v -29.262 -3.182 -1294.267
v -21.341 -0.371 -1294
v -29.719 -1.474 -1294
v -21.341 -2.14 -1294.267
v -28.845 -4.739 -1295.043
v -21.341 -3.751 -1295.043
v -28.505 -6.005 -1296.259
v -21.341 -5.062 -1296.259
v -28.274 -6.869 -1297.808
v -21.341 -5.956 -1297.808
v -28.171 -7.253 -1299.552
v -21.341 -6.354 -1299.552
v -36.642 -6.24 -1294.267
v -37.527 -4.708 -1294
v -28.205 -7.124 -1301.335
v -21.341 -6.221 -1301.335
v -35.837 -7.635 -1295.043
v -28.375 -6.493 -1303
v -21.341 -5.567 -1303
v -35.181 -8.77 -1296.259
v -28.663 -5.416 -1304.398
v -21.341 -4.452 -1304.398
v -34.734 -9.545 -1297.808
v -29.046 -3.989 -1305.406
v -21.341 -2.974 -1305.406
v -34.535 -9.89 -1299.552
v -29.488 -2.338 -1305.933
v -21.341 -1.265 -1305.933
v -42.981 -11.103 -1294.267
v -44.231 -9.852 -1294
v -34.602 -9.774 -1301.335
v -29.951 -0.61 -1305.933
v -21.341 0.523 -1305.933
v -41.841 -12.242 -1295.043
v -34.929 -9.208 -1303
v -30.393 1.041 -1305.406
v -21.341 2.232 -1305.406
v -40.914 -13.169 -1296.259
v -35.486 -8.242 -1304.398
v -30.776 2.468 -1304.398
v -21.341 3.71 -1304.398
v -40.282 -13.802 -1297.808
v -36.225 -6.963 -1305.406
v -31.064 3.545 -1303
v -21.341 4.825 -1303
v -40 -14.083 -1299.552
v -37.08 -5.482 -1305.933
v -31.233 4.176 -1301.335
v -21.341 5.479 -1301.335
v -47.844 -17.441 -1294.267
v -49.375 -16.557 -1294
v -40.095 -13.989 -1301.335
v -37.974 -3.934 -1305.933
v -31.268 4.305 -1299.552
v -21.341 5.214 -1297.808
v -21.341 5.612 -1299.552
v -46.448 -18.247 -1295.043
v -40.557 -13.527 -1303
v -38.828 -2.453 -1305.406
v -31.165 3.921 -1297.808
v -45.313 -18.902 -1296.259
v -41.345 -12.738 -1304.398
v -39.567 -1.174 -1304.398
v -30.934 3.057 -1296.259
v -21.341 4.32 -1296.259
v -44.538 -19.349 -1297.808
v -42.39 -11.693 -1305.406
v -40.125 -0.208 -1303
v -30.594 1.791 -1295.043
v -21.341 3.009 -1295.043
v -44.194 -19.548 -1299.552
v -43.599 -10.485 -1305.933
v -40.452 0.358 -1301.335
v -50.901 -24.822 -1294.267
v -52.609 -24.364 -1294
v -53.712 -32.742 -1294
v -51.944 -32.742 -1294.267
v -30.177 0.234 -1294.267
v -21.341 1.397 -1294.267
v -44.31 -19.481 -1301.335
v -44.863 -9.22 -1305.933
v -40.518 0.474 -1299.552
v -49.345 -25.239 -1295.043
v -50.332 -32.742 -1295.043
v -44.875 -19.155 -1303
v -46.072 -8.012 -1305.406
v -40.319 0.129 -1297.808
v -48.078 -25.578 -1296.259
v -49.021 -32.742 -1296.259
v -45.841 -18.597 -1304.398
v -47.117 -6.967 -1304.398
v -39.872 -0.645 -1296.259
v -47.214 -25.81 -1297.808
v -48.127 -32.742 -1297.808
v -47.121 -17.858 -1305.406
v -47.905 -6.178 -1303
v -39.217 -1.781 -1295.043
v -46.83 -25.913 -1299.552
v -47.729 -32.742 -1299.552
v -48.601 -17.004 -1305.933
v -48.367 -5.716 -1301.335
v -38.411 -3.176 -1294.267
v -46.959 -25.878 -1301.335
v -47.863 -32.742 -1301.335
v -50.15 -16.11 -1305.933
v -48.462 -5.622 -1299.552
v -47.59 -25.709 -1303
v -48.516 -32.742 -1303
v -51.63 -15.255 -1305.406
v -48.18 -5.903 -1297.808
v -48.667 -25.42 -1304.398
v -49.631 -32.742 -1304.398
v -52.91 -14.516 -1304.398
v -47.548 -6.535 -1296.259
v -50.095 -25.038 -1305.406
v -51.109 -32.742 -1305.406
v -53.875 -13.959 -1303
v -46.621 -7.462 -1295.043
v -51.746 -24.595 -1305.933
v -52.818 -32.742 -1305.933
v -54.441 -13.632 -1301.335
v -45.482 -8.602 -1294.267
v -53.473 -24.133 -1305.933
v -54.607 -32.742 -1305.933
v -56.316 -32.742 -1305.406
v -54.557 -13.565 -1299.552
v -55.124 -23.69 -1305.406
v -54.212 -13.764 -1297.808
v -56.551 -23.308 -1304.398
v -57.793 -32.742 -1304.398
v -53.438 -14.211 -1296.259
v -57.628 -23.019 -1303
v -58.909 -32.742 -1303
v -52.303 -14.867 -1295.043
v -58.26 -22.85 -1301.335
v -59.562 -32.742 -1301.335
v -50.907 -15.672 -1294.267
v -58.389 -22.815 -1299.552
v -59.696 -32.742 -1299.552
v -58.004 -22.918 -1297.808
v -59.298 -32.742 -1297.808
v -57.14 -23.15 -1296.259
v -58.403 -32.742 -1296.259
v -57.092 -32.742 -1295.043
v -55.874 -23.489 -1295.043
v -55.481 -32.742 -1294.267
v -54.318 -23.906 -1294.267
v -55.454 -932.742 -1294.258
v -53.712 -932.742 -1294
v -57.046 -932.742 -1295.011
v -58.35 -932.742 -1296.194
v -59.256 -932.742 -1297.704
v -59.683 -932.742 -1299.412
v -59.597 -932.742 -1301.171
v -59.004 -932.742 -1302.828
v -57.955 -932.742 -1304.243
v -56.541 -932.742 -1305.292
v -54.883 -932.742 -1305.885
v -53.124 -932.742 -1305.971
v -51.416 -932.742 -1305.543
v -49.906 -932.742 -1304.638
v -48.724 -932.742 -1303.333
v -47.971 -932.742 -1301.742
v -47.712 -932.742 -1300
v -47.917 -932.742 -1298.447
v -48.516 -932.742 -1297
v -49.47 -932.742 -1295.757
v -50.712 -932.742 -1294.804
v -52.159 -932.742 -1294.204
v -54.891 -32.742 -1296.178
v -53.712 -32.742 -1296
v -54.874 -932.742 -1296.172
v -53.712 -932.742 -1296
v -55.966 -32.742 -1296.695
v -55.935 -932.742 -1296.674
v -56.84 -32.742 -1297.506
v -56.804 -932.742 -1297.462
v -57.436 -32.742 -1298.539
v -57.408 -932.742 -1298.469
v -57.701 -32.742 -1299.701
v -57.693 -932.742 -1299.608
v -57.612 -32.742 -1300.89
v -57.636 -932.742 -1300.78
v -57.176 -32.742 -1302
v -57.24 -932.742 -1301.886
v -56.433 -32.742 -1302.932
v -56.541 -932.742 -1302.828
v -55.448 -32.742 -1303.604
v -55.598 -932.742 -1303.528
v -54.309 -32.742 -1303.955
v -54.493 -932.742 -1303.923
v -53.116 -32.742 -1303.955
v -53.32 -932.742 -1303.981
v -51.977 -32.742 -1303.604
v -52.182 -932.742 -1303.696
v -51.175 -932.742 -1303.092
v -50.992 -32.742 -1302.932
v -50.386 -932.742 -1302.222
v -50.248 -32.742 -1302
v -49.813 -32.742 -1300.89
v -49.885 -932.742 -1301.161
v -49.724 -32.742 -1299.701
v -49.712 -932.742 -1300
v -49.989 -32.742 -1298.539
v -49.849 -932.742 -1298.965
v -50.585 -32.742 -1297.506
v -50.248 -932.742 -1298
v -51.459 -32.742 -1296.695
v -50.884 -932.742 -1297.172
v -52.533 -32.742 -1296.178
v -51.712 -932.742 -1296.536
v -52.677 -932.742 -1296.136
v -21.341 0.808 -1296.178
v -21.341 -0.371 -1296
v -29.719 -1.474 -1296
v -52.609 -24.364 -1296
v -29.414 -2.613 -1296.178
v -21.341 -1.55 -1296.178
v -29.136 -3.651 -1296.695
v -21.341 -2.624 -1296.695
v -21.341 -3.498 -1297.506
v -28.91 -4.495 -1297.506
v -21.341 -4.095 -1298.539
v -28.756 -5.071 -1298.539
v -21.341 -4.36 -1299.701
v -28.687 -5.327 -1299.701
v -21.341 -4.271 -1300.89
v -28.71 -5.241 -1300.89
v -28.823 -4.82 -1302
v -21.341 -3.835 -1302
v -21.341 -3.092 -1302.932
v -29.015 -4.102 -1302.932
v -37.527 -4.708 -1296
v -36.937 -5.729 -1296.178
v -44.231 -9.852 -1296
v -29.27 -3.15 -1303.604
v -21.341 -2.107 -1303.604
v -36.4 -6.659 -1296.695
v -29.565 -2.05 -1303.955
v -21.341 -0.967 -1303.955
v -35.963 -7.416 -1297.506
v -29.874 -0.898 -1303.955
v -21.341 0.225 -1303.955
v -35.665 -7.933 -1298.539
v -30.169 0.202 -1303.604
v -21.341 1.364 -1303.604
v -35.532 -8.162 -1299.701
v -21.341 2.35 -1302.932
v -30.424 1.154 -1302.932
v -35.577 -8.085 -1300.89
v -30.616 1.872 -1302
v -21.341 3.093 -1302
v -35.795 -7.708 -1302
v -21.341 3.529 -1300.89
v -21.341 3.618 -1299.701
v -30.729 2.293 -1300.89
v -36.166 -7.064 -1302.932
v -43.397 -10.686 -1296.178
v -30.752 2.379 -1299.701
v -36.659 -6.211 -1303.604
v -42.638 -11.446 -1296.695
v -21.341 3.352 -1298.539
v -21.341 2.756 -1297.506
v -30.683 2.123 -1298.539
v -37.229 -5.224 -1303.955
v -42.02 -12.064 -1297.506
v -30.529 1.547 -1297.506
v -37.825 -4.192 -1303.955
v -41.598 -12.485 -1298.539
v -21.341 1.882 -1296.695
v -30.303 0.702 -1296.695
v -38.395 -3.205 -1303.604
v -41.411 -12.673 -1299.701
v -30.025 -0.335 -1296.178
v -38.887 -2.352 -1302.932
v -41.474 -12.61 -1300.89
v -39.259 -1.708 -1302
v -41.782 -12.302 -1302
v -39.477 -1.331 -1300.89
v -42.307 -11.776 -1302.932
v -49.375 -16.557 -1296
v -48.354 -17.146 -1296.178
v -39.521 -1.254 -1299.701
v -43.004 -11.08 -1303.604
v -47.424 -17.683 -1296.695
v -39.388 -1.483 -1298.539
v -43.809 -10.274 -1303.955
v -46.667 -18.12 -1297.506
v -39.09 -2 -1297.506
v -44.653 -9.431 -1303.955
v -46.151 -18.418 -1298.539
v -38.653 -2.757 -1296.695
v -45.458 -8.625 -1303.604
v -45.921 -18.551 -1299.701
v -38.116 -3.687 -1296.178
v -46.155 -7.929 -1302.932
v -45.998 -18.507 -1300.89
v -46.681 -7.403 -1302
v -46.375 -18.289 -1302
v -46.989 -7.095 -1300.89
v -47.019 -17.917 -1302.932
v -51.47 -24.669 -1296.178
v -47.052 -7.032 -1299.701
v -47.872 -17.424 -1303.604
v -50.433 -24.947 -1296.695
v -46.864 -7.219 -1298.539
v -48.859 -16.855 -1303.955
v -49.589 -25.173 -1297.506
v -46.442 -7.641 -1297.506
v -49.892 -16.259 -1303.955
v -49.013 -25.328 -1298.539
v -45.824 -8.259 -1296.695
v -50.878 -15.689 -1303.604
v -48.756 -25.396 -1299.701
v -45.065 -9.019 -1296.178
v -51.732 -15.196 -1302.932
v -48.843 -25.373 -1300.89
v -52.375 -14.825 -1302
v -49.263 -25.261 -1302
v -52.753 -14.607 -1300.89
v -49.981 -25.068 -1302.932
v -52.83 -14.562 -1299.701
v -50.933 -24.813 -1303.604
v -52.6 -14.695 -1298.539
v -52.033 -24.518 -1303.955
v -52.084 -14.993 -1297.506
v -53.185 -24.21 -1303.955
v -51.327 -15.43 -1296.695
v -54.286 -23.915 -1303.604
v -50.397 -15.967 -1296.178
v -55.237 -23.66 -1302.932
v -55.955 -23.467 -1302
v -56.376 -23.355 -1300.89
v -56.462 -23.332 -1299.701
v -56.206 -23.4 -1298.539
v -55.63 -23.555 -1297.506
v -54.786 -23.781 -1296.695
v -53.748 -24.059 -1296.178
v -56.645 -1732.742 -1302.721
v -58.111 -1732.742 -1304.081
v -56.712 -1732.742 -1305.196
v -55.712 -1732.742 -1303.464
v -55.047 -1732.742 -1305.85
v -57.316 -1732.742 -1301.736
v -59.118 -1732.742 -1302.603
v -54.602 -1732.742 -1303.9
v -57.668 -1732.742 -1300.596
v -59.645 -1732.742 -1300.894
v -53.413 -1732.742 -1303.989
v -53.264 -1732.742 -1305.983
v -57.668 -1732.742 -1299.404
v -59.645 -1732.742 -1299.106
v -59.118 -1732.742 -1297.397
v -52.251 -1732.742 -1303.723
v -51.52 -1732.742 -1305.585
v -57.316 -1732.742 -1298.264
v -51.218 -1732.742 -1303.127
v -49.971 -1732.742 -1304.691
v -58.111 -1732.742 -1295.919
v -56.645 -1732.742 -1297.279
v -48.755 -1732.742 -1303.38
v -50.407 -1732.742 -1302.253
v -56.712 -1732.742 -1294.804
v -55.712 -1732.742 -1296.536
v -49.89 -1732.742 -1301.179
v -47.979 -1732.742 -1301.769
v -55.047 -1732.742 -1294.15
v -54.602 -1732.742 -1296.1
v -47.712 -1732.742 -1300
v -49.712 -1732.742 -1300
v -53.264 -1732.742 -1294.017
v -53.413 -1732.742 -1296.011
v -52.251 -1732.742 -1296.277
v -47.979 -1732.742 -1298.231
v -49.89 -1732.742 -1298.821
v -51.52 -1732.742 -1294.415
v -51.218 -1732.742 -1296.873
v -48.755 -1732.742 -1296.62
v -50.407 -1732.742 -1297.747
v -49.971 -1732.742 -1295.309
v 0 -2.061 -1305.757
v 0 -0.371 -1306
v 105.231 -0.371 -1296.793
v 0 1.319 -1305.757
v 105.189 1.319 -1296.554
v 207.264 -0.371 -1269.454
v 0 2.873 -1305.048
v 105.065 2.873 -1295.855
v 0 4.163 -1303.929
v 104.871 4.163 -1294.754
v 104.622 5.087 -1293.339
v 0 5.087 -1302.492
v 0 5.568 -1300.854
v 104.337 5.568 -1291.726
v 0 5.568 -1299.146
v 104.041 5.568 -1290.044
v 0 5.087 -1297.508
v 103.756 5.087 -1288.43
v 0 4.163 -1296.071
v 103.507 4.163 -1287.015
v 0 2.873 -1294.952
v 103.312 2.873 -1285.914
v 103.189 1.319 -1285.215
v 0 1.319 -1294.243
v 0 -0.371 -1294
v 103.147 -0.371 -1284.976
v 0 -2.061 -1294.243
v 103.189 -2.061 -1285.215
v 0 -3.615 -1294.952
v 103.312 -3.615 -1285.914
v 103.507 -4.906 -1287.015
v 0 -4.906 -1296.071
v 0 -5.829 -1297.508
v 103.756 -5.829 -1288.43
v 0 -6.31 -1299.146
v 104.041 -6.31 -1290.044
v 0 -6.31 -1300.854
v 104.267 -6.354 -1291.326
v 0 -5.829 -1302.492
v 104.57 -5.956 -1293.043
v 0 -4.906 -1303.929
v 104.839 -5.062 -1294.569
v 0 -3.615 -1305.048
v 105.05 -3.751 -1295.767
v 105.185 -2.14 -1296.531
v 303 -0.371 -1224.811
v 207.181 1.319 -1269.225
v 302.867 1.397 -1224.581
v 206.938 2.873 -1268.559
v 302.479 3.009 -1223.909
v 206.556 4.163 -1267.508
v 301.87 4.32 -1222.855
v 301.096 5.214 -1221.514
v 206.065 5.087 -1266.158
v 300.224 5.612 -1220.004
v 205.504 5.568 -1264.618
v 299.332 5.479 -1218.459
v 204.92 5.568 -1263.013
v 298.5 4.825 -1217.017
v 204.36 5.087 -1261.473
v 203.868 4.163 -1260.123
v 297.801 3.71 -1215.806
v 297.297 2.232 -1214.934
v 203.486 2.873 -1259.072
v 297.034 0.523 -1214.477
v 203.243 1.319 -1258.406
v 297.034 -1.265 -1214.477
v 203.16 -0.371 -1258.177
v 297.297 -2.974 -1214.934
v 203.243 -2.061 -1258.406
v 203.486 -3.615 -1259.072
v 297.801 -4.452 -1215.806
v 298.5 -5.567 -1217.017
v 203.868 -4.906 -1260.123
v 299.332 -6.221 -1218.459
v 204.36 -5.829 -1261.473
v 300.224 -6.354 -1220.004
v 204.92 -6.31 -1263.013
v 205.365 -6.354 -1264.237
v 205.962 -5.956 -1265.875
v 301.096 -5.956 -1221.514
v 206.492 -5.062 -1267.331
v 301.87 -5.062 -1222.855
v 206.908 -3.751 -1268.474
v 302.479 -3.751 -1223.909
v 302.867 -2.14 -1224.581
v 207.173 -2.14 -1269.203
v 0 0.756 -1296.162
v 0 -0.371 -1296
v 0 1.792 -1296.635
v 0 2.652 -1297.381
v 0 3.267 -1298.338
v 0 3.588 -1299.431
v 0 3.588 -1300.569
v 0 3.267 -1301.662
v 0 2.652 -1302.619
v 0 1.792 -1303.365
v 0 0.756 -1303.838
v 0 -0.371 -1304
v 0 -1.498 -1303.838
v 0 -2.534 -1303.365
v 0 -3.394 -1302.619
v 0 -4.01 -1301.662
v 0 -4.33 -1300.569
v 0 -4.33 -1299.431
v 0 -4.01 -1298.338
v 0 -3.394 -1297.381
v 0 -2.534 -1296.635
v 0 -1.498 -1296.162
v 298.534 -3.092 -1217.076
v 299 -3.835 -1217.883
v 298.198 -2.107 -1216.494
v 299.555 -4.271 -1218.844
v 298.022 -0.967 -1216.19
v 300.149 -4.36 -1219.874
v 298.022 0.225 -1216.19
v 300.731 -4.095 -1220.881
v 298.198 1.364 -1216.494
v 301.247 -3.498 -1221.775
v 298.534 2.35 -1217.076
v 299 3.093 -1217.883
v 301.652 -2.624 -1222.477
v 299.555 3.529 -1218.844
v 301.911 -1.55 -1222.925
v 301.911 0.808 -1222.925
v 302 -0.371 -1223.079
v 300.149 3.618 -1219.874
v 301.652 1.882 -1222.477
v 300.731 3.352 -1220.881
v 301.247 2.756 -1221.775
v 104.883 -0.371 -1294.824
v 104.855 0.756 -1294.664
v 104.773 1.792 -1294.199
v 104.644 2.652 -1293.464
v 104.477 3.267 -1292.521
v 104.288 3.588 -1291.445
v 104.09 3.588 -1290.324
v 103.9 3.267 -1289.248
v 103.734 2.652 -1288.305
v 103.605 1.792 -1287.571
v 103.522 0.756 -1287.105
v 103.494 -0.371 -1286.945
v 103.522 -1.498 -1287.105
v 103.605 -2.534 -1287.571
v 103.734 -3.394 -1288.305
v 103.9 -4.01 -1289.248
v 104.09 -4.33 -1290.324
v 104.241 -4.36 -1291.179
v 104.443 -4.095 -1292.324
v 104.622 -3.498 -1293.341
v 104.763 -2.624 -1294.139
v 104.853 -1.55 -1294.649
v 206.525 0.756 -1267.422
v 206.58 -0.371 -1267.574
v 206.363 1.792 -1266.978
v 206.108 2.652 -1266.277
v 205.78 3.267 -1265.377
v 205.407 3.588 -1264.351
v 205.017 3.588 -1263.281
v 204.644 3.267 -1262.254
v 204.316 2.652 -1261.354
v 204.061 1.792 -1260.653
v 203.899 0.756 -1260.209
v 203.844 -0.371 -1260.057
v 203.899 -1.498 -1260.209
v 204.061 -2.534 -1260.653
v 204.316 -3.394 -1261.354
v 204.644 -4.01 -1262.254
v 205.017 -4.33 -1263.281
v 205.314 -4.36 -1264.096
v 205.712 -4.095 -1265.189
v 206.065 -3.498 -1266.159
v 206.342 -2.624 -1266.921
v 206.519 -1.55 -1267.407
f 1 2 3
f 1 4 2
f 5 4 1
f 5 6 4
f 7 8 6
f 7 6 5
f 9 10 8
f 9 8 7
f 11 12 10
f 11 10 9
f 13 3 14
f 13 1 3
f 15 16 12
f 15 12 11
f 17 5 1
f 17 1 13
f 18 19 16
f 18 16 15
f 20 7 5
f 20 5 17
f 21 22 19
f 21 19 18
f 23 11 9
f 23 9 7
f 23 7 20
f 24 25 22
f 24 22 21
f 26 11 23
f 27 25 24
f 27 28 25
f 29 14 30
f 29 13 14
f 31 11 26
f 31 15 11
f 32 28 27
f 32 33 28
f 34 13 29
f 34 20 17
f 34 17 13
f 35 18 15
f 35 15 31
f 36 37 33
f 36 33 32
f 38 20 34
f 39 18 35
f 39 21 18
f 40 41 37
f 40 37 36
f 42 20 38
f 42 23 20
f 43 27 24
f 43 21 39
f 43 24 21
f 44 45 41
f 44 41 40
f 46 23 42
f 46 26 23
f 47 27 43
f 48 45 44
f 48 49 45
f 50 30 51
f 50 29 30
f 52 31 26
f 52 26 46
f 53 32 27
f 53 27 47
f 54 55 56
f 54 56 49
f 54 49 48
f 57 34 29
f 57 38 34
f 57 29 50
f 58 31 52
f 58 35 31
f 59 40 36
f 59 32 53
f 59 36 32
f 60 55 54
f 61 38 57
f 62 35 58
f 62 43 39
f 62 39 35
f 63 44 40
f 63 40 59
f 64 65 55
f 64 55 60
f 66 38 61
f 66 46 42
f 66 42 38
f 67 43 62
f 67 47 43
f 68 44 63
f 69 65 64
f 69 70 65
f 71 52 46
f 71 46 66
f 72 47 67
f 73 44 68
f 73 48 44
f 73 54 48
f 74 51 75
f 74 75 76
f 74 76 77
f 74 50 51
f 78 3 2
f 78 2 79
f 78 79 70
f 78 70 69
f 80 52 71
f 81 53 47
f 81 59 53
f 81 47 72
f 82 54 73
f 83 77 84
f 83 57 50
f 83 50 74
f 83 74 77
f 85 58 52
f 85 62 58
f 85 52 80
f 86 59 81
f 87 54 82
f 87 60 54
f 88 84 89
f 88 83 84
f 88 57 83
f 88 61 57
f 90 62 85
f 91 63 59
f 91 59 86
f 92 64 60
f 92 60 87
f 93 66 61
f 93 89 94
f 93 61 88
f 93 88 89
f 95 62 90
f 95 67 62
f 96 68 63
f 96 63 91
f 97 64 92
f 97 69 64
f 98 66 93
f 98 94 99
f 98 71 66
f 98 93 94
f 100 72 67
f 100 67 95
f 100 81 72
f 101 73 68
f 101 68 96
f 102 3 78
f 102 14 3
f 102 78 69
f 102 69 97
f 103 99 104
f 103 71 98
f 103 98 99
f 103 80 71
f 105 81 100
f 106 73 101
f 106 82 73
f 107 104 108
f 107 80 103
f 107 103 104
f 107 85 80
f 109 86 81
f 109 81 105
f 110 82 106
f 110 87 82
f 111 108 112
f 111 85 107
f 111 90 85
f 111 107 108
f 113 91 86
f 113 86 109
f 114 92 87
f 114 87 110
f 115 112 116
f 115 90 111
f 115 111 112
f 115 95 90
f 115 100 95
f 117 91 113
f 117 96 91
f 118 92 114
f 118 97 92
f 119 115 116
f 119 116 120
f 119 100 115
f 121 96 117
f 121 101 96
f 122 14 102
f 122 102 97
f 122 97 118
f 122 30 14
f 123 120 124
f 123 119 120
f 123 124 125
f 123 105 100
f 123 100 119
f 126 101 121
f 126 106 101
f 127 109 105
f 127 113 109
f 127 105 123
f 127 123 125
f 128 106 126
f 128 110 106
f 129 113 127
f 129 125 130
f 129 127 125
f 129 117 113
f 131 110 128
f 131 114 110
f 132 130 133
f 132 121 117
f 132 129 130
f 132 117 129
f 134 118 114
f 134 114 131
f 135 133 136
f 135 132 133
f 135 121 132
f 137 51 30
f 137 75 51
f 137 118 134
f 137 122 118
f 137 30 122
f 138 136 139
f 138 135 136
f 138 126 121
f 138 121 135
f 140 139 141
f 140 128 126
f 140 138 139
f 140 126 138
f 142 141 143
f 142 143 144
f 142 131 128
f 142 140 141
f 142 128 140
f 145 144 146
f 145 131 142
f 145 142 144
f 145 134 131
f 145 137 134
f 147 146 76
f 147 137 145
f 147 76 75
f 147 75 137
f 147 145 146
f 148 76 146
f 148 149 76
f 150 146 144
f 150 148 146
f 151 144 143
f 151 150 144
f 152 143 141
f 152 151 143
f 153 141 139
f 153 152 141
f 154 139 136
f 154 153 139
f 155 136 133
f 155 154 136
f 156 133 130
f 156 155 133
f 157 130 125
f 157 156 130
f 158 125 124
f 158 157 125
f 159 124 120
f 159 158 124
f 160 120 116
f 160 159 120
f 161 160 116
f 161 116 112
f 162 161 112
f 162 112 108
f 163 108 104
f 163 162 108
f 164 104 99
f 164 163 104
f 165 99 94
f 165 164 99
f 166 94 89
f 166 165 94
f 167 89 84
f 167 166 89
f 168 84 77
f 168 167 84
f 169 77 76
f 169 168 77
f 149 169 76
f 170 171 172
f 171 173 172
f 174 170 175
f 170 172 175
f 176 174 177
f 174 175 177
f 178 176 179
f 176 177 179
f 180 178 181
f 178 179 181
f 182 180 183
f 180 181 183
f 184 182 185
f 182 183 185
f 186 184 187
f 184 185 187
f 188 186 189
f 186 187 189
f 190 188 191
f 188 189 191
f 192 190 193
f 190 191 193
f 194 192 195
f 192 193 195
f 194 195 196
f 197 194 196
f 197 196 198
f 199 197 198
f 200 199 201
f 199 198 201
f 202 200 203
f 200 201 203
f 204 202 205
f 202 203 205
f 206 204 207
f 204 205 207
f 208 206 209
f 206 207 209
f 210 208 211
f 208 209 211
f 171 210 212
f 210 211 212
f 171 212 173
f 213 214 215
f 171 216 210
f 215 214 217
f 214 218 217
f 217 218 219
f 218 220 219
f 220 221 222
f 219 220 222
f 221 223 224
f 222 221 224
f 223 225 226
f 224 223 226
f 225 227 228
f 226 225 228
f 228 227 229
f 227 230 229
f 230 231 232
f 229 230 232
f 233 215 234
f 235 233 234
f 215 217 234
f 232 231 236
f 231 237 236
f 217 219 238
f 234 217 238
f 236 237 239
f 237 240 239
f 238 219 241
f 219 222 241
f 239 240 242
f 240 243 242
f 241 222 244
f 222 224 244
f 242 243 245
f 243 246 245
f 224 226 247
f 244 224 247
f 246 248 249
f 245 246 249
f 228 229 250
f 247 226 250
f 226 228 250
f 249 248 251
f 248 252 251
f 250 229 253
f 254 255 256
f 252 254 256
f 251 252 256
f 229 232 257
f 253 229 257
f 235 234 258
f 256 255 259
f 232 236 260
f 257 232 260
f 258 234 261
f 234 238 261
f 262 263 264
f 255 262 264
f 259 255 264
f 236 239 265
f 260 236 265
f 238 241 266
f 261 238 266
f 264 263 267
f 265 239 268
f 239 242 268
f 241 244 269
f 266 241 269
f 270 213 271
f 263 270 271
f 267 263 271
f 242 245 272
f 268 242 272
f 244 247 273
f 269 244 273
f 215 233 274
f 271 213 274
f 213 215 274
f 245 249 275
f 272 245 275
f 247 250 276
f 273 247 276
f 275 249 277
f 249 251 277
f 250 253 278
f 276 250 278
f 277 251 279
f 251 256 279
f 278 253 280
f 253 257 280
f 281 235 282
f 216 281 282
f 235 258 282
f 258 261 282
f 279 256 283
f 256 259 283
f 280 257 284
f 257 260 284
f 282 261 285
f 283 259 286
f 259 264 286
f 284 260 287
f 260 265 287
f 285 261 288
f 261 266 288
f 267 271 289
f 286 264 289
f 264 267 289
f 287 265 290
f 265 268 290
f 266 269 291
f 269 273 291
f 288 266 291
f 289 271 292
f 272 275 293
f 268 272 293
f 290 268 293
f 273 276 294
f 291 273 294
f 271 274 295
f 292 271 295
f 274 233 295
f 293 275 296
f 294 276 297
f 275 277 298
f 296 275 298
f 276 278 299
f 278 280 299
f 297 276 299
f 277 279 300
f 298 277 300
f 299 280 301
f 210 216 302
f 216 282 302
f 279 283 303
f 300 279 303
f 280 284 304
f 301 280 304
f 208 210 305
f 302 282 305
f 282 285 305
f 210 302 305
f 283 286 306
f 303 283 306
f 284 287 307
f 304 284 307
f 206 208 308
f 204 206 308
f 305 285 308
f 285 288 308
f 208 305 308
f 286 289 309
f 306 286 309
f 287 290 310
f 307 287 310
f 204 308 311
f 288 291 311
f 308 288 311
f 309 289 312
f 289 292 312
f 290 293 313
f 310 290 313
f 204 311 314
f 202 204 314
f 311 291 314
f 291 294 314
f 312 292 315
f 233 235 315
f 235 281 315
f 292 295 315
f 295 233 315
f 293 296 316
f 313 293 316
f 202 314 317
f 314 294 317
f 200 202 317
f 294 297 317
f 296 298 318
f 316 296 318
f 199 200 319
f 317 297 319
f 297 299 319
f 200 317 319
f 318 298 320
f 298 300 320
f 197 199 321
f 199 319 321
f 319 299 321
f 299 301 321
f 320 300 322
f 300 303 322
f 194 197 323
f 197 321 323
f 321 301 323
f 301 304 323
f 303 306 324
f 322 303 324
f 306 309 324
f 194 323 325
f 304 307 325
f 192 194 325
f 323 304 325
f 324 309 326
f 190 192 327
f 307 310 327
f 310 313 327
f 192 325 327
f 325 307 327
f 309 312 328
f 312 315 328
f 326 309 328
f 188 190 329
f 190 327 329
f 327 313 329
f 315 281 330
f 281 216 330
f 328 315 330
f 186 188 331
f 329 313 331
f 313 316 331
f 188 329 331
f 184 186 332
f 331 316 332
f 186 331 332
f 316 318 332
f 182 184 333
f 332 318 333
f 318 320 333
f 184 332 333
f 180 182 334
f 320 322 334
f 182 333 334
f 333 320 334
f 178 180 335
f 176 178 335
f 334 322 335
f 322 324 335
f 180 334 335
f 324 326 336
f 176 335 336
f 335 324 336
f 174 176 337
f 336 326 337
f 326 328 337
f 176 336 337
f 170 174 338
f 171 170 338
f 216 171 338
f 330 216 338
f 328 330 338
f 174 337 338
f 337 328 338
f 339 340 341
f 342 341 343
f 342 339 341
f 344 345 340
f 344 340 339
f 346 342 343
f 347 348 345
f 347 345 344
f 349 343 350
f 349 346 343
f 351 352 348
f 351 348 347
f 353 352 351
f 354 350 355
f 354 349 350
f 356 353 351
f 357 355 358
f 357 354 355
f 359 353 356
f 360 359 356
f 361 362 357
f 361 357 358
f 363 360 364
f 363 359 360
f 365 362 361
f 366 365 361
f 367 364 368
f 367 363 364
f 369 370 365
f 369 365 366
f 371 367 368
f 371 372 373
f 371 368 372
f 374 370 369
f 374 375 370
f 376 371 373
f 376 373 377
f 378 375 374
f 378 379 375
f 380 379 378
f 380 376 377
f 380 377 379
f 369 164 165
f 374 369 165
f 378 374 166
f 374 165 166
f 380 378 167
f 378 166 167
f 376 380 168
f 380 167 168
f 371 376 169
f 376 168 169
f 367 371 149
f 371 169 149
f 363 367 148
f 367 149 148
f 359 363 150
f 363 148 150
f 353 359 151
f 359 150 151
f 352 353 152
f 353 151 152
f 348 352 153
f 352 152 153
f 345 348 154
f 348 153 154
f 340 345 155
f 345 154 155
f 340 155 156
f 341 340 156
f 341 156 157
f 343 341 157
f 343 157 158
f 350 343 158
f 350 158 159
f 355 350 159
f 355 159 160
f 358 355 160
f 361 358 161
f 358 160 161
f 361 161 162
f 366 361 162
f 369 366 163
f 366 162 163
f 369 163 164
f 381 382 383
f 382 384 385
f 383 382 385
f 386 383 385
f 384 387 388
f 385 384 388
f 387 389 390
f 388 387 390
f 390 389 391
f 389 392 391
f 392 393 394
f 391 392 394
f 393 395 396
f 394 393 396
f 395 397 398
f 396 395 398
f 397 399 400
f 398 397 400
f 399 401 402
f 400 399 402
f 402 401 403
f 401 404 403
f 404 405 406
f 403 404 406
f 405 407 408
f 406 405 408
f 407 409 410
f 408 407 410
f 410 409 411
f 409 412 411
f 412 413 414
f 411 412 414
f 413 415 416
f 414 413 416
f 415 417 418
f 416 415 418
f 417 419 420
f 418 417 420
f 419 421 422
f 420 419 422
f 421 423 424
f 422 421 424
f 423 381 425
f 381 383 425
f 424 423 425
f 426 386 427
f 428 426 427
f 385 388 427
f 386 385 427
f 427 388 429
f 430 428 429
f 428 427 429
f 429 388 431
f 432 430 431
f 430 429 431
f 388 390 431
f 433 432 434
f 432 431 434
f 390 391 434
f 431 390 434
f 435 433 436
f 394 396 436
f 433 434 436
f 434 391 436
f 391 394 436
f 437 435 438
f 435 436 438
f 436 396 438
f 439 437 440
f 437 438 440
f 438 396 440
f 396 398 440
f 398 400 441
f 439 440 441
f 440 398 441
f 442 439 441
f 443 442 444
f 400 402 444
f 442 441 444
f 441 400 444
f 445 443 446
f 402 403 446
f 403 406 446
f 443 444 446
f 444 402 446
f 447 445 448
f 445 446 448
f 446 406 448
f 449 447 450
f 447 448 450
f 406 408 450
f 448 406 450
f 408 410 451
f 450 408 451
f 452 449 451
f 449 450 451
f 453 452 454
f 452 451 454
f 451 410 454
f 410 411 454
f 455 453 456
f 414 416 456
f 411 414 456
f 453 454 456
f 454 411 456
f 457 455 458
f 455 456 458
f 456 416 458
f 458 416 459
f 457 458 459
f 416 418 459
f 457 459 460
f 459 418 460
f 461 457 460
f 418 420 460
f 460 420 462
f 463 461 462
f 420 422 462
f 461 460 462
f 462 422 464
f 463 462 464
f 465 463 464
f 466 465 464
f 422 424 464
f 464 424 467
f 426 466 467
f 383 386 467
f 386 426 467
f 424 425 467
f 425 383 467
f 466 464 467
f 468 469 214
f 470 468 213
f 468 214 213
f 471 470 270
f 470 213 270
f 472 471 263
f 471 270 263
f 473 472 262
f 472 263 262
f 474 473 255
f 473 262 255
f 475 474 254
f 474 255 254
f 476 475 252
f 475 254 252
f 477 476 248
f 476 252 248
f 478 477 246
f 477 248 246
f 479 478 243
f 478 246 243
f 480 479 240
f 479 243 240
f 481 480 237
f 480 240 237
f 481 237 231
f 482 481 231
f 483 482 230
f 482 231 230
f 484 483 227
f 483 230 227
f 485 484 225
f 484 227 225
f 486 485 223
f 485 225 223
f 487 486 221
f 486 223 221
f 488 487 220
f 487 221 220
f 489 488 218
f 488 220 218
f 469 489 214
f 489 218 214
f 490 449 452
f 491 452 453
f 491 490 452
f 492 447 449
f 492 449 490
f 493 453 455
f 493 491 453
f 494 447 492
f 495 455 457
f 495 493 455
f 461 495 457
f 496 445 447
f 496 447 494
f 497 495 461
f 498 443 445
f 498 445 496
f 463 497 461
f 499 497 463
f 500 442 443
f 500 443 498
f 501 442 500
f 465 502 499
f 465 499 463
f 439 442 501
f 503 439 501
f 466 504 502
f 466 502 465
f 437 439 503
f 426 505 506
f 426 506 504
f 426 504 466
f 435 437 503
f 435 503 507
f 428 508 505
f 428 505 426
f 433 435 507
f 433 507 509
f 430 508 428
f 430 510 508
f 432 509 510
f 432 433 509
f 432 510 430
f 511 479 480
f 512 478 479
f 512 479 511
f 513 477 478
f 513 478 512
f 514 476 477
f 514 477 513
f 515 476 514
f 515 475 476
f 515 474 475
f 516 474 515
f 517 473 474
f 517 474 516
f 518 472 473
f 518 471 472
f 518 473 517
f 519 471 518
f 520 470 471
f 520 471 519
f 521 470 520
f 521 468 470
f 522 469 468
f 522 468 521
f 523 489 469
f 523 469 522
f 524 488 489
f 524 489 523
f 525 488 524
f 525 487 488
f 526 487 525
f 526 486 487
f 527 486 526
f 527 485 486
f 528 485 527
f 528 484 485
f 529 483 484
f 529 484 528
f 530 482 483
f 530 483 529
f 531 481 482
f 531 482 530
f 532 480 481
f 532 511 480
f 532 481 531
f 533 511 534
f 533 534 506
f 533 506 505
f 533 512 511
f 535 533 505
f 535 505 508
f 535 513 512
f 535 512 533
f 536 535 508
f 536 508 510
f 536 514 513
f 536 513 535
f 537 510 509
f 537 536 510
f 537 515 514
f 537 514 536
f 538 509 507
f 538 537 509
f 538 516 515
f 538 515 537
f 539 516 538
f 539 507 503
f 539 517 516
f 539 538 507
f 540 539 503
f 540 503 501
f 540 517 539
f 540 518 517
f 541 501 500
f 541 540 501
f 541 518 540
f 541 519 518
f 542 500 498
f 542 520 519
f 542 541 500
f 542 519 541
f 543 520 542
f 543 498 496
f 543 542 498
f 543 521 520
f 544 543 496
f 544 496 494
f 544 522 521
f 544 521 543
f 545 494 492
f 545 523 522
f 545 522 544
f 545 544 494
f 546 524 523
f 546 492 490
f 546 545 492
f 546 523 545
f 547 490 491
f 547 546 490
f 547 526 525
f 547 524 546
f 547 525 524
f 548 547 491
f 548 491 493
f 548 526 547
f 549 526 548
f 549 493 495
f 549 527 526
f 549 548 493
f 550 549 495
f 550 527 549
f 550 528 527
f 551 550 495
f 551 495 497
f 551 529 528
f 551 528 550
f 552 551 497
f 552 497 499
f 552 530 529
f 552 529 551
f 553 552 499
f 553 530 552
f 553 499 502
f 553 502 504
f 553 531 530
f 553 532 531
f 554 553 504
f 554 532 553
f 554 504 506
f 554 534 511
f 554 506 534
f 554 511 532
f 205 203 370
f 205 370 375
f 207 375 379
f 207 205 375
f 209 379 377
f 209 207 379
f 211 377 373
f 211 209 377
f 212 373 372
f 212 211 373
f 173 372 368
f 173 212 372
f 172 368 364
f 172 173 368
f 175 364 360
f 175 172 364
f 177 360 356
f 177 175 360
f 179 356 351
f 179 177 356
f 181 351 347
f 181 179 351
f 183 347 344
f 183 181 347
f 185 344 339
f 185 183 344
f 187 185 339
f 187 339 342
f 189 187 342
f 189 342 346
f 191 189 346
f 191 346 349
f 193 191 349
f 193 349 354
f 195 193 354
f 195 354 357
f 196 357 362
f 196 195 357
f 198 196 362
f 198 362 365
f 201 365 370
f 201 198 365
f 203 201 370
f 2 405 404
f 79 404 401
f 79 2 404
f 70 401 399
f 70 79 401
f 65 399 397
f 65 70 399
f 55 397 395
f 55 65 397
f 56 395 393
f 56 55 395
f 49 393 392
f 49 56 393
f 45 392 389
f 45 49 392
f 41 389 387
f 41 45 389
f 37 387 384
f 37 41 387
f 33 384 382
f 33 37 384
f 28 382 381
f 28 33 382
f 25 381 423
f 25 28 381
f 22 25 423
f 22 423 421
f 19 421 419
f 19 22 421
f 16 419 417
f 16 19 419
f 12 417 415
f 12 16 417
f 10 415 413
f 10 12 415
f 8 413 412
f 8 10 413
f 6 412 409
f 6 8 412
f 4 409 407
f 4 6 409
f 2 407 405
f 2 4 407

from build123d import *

# Parameters (mm, degrees)
SKETCH_1_R      = 6
SKETCH_1_R_2    = 4
REVOLVE_1_ANGLE = 30
SKETCH_2_R      = 15
SKETCH_2_R_2    = 10
SKETCH_2_R_3    = 6
SKETCH_2_R_4    = 4
SKETCH_11_R     = 6
SKETCH_11_R_2   = 4
EXTRUDE_1_DEPTH = 800


with BuildPart() as part:
    # 草图1 → 旋转1 (revolve)
    with BuildSketch(Plane(origin=(0, 0, 0), x_dir=(0, 0, -1), z_dir=(1, 0, 0))):
        with Locations((1300, -0.371055822)):
            Circle(SKETCH_1_R)
        with Locations((1300, -0.371055822)):
            Circle(SKETCH_1_R_2, mode=Mode.SUBTRACT)
    revolve(axis=Axis((0, 0, -700), (0, -1, 0)), revolution_arc=REVOLVE_1_ANGLE)

    # 扫描1: sweep along a path in 草图3
    with BuildLine(Plane.YX.offset(500)) as sweep_1_path:
        Line((0, 0), (0, -21.341132523))
        ThreePointArc((0, -21.341132523), (-9.589995058, -44.493428655), (-32.742291189, -54.083423712))
        Line((-32.742291189, -54.083423712), (-932.742291189, -54.083423712))
    # 草图2 → 扫描1 (sweep)
    # profile 1 of 2: a face of its own
    with BuildSketch(Plane.ZY):
        with Locations((-500, -0.371055822)):
            Circle(SKETCH_2_R)
        with Locations((-500, -0.371055822)):
            Circle(SKETCH_2_R_2, mode=Mode.SUBTRACT)
    # profile 2 of 2: a face of its own
    with BuildSketch(Plane.ZY):
        with Locations((-1300, -0.371055822)):
            Circle(SKETCH_2_R_3)
        with Locations((-1300, -0.371055822)):
            Circle(SKETCH_2_R_4, mode=Mode.SUBTRACT)
    sweep(path=sweep_1_path.line)


with BuildPart() as sweep_1_kept_piece:
    # of the separate pieces the step leaves, the one the design keeps (sweep_1_pieces_kept)
    add(part.part.solids().sort_by_distance((0, -0.371055822, -1306))[0])

    # 草图11 → 凸台-拉伸1 (add)
    with BuildSketch(Plane.XZ.offset(932.742291189)):
        with Locations((-53.712367891, -1300)):
            Circle(SKETCH_11_R)
        with Locations((-53.712367891, -1300)):
            Circle(SKETCH_11_R_2, mode=Mode.SUBTRACT)
    extrude(amount=EXTRUDE_1_DEPTH)


solid = sweep_1_kept_piece.part
